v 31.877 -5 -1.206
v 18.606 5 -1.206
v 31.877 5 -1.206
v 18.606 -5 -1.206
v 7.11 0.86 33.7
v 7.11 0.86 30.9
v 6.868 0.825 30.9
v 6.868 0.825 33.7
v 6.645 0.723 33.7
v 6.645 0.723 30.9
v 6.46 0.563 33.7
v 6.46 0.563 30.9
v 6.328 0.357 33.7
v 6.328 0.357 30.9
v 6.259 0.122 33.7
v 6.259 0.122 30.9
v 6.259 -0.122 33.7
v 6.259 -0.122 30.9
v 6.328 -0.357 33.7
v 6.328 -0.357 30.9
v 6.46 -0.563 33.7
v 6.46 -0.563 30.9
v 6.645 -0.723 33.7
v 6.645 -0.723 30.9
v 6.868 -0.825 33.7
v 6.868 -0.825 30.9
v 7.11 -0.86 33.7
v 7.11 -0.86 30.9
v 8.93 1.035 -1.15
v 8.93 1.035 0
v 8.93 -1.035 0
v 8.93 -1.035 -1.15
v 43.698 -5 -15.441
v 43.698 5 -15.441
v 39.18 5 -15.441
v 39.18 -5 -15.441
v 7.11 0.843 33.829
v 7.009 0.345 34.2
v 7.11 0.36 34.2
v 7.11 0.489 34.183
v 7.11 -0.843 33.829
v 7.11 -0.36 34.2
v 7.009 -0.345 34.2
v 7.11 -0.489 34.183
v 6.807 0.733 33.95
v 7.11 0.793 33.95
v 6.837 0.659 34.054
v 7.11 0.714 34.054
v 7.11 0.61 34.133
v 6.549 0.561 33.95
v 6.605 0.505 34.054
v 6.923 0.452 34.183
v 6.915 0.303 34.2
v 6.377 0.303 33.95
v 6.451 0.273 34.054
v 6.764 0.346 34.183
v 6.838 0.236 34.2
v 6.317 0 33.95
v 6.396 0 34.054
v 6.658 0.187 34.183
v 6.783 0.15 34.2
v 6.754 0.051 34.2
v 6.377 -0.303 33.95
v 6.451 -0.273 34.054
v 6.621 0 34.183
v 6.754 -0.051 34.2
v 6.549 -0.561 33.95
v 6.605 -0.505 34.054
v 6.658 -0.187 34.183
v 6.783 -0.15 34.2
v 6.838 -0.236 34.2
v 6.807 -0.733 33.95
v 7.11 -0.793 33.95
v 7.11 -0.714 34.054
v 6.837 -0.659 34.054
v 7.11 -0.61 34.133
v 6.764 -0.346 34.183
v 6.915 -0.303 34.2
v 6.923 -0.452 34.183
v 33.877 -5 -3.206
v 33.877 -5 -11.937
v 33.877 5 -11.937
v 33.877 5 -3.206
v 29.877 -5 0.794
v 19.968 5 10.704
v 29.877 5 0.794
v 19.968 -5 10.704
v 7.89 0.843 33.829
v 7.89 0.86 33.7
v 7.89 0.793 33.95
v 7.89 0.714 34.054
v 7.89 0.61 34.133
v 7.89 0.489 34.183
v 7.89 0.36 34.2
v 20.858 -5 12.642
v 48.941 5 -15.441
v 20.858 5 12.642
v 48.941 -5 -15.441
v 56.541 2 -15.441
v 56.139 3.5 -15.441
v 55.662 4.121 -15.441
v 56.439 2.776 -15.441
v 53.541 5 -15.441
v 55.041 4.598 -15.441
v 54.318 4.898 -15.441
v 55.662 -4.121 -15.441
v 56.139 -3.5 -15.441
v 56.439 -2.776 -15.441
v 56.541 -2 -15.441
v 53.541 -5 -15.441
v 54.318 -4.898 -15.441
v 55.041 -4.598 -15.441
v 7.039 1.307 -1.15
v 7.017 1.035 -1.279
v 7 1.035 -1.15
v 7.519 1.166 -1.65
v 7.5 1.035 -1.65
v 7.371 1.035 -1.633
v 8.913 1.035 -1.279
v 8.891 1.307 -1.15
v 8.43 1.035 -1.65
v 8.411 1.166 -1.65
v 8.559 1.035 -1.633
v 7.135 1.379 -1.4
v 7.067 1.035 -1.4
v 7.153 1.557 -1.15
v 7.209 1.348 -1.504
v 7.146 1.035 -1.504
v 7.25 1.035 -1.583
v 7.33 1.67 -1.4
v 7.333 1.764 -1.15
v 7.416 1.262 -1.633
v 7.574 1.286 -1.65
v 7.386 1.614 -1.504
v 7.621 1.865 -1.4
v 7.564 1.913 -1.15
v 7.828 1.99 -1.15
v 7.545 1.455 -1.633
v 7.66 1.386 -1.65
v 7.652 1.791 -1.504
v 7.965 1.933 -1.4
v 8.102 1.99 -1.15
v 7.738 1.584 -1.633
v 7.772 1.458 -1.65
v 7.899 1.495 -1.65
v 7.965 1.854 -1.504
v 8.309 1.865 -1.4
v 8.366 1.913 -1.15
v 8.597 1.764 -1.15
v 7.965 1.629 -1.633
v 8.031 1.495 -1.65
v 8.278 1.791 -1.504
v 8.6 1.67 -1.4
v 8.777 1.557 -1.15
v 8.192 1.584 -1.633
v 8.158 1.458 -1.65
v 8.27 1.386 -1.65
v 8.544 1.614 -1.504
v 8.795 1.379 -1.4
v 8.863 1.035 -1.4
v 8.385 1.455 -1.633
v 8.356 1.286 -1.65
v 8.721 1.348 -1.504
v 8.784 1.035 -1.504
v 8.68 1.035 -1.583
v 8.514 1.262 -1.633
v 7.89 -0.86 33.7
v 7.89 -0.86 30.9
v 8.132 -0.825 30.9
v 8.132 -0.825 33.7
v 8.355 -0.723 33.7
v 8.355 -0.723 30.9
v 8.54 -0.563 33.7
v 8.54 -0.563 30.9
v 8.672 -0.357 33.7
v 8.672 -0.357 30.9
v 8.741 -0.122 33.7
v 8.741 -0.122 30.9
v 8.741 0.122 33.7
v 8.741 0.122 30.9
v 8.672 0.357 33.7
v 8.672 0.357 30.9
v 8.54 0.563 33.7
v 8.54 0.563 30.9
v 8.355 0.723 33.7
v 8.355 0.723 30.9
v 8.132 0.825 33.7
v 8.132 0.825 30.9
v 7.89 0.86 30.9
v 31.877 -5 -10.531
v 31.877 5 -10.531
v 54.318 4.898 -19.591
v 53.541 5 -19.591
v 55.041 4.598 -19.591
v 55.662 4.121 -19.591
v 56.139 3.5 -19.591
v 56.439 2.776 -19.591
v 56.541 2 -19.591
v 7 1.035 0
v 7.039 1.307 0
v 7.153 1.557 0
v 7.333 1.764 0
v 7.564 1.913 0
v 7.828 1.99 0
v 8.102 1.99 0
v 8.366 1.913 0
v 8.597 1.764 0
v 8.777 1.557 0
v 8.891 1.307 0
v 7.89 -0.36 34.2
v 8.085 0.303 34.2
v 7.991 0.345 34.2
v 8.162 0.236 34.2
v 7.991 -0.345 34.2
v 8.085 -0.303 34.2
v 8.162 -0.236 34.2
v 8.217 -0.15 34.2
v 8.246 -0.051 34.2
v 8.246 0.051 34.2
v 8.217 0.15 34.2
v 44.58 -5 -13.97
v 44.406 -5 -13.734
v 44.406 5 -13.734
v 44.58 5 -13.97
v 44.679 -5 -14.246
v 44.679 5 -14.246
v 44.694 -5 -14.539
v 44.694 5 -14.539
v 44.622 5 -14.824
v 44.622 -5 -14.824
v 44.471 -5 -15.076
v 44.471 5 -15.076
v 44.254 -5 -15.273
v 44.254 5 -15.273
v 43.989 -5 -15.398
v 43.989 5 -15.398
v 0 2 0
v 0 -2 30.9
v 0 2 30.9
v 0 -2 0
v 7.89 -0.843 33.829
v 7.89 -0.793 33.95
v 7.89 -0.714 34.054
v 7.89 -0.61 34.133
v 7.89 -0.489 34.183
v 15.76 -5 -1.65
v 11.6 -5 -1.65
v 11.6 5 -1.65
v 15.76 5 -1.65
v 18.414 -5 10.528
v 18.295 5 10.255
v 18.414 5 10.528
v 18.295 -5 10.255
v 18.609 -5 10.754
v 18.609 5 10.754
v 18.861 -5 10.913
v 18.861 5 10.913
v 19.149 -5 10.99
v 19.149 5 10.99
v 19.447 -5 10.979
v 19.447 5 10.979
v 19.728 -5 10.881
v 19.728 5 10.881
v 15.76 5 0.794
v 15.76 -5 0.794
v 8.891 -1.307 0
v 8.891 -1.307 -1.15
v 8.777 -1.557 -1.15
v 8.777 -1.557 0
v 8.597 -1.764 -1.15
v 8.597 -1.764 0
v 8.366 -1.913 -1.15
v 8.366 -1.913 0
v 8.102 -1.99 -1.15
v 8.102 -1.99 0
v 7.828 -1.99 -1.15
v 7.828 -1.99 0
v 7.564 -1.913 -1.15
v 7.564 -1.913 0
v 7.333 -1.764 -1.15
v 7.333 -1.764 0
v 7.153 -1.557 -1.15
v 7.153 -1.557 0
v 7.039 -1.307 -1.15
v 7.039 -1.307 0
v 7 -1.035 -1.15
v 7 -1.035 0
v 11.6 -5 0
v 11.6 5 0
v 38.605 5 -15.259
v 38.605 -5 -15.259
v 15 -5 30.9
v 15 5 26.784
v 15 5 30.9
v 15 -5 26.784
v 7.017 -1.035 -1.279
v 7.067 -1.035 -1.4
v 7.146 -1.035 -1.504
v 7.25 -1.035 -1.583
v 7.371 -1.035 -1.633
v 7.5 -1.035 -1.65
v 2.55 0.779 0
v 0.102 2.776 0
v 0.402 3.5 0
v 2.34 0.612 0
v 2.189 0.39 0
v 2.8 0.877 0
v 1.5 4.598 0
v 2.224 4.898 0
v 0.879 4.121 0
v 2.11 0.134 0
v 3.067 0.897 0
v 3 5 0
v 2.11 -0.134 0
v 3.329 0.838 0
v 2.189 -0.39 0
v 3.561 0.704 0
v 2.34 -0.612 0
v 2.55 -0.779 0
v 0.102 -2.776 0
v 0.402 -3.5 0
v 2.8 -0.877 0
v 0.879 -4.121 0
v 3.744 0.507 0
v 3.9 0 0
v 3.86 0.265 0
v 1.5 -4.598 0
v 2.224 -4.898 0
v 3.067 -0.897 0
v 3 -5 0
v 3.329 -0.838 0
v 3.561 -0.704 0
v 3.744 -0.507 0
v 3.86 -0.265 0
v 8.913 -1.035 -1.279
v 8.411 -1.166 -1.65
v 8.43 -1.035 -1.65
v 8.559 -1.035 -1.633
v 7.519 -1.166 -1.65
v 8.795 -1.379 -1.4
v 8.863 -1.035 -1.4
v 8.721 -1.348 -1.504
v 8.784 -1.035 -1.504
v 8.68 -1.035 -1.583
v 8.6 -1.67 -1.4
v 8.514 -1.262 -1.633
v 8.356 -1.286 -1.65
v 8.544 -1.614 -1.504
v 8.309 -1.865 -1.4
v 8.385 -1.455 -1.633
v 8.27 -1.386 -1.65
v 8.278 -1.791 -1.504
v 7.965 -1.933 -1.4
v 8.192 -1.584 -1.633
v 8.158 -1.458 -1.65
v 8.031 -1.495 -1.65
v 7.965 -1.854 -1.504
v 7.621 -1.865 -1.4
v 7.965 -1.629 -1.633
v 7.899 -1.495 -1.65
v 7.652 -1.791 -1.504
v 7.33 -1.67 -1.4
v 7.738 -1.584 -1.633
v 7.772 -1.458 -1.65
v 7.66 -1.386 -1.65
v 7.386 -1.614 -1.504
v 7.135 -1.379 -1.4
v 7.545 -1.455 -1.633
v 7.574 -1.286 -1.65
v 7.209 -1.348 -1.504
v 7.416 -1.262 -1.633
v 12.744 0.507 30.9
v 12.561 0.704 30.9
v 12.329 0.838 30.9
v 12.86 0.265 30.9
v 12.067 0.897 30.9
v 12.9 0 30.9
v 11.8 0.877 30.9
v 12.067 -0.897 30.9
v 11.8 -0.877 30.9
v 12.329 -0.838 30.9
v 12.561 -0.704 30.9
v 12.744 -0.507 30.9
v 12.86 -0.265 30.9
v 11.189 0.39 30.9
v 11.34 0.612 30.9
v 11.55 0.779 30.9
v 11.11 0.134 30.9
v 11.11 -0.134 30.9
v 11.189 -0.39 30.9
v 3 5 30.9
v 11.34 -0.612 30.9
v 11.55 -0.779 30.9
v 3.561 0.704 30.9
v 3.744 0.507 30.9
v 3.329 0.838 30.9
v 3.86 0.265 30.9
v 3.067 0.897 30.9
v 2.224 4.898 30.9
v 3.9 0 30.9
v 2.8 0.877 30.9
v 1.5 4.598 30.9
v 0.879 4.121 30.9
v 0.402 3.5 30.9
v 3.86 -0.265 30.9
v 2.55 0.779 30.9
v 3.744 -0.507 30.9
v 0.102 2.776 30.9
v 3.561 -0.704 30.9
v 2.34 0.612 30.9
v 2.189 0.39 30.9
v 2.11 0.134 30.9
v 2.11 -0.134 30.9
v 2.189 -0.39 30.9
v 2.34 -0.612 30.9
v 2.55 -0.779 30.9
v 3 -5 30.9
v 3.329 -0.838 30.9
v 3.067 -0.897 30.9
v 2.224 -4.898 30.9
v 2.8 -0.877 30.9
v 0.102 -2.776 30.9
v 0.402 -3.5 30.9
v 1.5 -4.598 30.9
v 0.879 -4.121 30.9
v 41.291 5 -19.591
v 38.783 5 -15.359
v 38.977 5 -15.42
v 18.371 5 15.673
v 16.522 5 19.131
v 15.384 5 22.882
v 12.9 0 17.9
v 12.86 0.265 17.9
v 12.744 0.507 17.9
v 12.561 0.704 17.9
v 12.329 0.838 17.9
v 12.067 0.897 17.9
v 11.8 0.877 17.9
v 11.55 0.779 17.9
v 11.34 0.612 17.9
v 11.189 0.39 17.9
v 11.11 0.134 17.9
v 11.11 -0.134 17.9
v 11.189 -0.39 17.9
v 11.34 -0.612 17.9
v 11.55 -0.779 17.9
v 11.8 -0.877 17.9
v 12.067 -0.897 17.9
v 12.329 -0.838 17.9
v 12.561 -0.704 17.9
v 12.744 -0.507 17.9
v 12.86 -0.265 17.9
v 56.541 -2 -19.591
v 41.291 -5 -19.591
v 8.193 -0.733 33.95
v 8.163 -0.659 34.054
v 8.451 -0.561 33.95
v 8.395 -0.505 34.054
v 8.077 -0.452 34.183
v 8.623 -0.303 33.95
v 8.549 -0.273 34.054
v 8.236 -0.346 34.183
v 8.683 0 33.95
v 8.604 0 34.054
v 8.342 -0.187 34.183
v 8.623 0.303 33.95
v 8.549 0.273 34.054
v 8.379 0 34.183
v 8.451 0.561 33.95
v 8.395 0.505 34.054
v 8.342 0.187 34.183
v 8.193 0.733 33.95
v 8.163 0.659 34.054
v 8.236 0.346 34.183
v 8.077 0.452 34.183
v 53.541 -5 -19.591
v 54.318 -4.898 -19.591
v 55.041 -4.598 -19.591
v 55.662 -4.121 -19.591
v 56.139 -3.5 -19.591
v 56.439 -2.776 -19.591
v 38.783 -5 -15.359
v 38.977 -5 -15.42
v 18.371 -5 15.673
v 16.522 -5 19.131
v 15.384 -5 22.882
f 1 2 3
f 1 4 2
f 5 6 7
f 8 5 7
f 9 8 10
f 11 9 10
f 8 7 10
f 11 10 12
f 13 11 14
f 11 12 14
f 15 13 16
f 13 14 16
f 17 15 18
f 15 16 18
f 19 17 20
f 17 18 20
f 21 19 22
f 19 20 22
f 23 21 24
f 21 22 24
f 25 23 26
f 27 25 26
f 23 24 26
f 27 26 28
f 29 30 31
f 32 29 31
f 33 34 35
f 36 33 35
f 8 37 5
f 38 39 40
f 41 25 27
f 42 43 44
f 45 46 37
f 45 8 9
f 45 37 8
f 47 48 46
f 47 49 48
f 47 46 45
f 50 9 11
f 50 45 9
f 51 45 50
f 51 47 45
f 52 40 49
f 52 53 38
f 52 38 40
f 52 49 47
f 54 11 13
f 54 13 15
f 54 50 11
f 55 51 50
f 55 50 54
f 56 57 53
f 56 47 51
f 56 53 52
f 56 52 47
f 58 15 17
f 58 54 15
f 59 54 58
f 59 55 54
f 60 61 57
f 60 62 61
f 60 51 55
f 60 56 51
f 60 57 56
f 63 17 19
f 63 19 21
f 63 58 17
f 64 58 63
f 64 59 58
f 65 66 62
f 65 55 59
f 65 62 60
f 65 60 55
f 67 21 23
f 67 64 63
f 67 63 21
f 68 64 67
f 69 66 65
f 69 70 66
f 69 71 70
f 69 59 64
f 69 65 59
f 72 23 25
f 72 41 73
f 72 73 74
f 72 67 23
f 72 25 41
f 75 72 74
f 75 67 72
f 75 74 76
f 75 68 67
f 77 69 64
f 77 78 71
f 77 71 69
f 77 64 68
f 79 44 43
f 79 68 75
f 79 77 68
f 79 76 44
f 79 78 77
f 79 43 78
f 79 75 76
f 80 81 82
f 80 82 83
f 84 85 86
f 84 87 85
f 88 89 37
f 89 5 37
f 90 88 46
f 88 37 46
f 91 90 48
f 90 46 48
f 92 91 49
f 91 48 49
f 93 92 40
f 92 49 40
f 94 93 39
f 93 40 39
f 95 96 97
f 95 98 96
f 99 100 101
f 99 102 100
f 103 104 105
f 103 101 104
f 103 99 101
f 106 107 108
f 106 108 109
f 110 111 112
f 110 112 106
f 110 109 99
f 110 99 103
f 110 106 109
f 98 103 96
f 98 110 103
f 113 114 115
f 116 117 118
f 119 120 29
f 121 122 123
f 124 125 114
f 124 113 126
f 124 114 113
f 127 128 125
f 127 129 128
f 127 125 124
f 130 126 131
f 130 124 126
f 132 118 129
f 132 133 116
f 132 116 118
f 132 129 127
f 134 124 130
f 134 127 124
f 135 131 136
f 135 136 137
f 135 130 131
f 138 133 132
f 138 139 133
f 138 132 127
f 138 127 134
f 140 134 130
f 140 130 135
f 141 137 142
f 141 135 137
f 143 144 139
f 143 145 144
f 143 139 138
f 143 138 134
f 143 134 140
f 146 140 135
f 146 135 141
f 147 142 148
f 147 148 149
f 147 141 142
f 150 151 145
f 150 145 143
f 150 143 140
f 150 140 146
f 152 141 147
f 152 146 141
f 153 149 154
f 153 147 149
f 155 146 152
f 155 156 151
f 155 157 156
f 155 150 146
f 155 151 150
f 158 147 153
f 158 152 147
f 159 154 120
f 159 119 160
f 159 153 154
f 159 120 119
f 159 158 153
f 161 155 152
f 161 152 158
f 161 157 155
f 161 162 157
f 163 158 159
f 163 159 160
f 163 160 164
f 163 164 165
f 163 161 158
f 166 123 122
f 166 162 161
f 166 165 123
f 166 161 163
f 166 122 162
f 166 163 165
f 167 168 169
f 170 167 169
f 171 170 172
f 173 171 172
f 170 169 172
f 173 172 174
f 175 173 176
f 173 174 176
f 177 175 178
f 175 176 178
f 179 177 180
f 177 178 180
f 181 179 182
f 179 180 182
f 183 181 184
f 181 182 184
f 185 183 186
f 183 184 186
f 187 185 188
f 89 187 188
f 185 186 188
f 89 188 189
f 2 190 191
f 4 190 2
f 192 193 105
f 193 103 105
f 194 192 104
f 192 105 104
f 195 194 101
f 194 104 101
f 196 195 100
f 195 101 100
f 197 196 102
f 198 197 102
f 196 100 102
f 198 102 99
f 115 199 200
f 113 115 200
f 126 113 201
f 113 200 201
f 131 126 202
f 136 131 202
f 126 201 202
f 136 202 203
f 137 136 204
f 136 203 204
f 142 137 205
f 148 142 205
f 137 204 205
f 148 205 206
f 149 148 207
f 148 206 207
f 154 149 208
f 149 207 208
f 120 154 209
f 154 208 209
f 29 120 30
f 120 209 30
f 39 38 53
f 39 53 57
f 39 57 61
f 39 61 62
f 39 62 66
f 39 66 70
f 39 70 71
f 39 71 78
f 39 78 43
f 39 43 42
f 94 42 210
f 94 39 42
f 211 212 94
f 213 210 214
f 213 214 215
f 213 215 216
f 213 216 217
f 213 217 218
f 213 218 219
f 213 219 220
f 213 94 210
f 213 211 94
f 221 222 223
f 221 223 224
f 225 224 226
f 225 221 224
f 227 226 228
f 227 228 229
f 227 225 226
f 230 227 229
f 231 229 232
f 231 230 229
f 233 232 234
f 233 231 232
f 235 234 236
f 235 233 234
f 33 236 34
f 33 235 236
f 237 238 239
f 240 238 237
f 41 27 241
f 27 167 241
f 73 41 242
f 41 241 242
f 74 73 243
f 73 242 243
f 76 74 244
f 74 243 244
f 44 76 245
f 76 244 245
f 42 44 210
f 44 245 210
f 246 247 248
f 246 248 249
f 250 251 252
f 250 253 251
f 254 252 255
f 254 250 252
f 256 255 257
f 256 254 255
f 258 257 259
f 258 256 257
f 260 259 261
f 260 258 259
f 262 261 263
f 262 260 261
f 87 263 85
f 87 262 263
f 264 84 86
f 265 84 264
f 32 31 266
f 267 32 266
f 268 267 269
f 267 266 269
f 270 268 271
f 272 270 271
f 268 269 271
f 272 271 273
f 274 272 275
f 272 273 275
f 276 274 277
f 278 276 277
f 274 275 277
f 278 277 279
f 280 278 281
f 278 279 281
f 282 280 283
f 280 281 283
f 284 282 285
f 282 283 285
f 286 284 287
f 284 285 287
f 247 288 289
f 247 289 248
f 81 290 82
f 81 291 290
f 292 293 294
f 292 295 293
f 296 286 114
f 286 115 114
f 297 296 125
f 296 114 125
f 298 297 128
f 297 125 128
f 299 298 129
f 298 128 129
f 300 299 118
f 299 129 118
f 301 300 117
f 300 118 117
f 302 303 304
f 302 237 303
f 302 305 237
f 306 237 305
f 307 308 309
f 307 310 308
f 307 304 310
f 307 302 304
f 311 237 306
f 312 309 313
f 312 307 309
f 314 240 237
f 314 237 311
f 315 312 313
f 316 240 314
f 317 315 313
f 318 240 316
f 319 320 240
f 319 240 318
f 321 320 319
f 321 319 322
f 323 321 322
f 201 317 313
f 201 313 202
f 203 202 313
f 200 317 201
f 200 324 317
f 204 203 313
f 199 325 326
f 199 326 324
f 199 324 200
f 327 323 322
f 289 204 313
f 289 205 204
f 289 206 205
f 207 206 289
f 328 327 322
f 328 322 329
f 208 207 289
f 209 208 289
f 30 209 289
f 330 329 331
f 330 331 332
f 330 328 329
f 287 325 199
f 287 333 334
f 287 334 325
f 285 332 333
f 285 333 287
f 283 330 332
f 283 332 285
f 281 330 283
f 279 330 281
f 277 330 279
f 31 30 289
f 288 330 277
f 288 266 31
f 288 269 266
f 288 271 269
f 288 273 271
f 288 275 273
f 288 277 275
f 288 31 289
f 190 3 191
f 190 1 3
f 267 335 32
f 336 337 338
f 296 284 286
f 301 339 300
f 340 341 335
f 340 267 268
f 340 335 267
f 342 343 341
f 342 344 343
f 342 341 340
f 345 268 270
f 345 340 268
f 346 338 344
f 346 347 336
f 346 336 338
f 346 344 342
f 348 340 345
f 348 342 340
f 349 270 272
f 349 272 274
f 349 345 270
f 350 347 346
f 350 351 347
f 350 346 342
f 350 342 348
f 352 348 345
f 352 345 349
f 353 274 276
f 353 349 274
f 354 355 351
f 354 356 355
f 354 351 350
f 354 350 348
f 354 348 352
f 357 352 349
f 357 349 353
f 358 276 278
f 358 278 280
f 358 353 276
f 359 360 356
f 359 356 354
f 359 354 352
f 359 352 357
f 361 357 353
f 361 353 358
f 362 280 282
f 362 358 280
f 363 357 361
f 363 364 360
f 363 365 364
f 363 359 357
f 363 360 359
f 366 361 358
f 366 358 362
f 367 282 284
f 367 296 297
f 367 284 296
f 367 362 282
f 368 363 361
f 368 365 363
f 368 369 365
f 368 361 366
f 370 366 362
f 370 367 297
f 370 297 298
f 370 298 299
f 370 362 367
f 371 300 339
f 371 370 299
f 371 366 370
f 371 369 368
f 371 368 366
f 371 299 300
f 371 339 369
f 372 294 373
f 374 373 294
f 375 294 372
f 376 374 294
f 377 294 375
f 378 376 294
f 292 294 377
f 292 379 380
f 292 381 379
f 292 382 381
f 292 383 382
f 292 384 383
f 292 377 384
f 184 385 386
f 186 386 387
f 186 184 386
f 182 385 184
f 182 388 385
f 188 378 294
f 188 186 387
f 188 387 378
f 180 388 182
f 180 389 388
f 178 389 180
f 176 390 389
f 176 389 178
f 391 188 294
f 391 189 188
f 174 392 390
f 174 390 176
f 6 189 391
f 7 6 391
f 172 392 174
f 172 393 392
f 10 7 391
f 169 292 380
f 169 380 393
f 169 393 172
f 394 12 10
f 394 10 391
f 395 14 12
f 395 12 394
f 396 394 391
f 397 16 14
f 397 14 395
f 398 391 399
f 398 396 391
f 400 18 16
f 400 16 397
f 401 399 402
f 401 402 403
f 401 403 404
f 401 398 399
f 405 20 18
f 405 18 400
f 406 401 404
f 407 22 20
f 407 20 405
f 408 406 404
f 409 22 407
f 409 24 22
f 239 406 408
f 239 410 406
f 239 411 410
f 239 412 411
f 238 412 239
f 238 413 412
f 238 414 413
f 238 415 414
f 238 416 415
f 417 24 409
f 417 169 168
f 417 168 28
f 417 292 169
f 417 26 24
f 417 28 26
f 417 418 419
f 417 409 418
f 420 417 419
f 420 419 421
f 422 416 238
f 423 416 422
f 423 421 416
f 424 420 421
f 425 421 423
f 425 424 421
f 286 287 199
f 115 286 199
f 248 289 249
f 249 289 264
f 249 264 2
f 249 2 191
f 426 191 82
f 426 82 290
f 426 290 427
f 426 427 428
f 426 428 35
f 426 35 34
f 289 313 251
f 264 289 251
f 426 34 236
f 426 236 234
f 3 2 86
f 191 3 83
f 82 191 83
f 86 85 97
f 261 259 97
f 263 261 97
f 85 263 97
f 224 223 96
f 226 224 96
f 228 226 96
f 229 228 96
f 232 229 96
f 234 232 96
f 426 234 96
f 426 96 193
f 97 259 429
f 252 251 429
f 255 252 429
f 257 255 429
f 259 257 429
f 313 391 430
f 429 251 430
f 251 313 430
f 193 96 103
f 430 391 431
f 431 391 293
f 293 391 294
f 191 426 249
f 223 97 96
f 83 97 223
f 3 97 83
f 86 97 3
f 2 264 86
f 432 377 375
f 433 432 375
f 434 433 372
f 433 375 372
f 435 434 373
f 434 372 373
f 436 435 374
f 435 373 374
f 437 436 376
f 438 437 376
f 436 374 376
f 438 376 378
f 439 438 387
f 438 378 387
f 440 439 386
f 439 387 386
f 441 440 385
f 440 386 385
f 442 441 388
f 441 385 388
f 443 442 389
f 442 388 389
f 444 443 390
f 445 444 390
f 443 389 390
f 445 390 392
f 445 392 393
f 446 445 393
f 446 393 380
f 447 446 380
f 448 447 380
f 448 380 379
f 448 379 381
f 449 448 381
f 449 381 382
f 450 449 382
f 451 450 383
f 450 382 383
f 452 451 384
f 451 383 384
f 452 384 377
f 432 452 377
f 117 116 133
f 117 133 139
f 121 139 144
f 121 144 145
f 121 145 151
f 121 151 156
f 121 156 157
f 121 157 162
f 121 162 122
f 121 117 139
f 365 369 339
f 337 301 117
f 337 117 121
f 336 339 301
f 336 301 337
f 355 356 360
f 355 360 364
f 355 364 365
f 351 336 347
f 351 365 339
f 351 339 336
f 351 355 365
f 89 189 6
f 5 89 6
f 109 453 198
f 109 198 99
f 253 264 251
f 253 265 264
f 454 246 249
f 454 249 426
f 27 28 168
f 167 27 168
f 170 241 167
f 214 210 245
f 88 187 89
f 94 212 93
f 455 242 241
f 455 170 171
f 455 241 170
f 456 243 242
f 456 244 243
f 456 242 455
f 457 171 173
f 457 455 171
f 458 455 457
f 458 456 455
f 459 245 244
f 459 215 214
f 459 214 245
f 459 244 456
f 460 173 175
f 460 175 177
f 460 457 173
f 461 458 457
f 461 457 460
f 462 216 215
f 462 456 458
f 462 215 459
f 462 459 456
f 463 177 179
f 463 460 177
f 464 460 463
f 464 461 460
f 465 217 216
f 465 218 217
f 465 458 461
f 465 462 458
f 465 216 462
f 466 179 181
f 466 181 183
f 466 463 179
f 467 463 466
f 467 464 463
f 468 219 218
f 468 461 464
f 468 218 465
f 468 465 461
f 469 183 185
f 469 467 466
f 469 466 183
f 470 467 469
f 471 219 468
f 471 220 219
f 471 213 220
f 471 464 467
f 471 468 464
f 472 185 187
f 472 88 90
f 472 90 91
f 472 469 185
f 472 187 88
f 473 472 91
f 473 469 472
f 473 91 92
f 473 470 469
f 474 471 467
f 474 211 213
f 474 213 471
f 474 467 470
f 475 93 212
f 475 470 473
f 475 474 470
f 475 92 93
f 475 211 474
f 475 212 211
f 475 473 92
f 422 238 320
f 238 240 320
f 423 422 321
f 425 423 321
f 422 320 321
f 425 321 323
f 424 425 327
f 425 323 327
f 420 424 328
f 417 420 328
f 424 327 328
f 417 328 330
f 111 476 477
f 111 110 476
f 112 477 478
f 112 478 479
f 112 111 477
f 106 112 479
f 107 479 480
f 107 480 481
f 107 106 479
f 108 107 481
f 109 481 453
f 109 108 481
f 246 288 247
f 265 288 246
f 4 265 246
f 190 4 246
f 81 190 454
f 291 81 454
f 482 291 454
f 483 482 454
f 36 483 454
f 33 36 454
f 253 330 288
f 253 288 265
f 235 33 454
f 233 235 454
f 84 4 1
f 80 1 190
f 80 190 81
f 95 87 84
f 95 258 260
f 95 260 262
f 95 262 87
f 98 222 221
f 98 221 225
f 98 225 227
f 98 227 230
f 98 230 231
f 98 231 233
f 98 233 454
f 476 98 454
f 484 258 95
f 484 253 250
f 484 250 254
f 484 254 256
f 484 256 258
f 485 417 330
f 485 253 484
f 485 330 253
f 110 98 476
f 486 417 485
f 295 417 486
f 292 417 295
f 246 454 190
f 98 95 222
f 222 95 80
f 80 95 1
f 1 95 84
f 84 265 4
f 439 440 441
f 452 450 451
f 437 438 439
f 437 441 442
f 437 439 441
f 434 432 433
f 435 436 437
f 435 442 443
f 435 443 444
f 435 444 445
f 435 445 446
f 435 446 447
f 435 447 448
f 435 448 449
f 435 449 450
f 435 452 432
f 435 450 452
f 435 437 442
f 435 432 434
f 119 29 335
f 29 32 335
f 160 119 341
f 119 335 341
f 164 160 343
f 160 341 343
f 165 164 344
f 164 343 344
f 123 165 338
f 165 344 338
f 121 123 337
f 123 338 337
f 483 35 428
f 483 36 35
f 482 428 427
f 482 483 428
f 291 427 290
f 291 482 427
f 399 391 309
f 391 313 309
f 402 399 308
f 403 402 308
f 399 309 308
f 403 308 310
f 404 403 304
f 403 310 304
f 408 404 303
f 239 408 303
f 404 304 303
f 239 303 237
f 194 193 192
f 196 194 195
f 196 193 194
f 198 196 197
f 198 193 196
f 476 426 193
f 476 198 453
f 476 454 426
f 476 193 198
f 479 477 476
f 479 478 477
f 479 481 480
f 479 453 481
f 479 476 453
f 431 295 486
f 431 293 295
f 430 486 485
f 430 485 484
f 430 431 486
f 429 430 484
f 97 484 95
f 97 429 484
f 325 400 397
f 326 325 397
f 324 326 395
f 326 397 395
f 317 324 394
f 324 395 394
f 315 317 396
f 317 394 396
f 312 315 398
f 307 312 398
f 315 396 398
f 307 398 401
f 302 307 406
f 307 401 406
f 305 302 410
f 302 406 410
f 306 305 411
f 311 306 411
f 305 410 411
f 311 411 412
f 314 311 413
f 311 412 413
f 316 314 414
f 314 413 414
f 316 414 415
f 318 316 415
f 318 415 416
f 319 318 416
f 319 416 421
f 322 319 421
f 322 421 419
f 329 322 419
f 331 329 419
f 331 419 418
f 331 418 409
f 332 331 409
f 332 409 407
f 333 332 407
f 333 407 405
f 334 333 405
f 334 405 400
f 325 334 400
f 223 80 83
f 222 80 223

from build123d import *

# Parameters (mm, degrees)
F1_DEPTH = 5
F2_R     = 0.9
F3_DEPTH = 50.492125497
F4_DEPTH = 13
F6_DEPTH = 3.3
F8_DEPTH = 1.65
F9_R     = 0.5
F10_R    = 3
F11_R    = 20


with BuildPart() as f1:
    # F0 (on Front) → F1 (new body, symmetric)
    with BuildSketch(Plane.XZ):
        Polygon((15, 30.9), (0, 30.9), (0, 0), (11.6, 0), (11.6, -1.65), (15.76, -1.65), (41.291125497, -19.591125497), (56.541125497, -19.591125497), (56.541125497, -15.441125497), (48.941125497, -15.441125497), (15, 18.5), align=None)
        Polygon((31.8771428741, -10.5313410853), (18.6061007646, -1.2055699989), (31.8771428741, -1.2055699989), align=None, mode=Mode.SUBTRACT)
        with BuildLine():
            Line((33.8771428741, -11.9367727024), (33.8771428741, -3.2055699989))
            Line((33.8771428741, -3.2055699989), (44.405591591, -13.7340187158))
            ThreePointArc((44.405591591, -13.7340187158), (44.6223643423, -14.8238089293), (43.6984848098, -15.441125497))
            Line((43.6984848098, -15.441125497), (39.1802365995, -15.441125497))
            ThreePointArc((39.1802365995, -15.441125497), (38.8787292634, -15.3945893538), (38.6052839044, -15.2593121495))
            Line((38.6052839044, -15.2593121495), (33.8771428741, -11.9367727024))
        make_face(mode=Mode.SUBTRACT)
        with BuildLine():
            Line((29.8771428741, 0.7944300011), (15.76, 0.7944300011))
            Line((15.76, 0.7944300011), (18.2950155817, 10.25523695))
            ThreePointArc((18.2950155817, 10.25523695), (19.0021223629, 10.9623437312), (19.9680481892, 10.7035246861))
            Line((19.9680481892, 10.7035246861), (29.8771428741, 0.7944300011))
        make_face(mode=Mode.SUBTRACT)
    extrude(amount=F1_DEPTH, both=True)

    # F2 (on face) → F3 (cut, through all)
    with BuildSketch(Plane.XY.offset(30.9)):
        with Locations((3, 0)):
            Circle(F2_R)
    extrude(amount=-F3_DEPTH, mode=Mode.SUBTRACT)

    # F2 (on face) → F4 (cut)
    with BuildSketch(Plane.XY.offset(30.9)):
        with Locations((12, 0)):
            Circle(F2_R)
    extrude(amount=-F4_DEPTH, mode=Mode.SUBTRACT)

    # F5 (on face) → F6 (join)
    with BuildSketch(Plane.XY.offset(30.9)):
        with BuildLine():
            Line((7.89, 0.86), (7.11, 0.86))
            ThreePointArc((7.11, 0.86), (6.25, 0), (7.11, -0.86))
            Line((7.11, -0.86), (7.89, -0.86))
            ThreePointArc((7.89, -0.86), (8.75, 0), (7.89, 0.86))
        make_face()
    extrude(amount=F6_DEPTH)

    # F7 (on face) → F8 (join, through all)
    with BuildSketch(Plane(origin=(0, 0, 0), x_dir=(1, 0, 0), z_dir=(0, 0, -1))):
        with BuildLine():
            Line((8.93, -1.035), (8.93, 1.035))
            ThreePointArc((8.93, 1.035), (7.965, 2), (7, 1.035))
            Line((7, 1.035), (7, -1.035))
            ThreePointArc((7, -1.035), (7.965, -2), (8.93, -1.035))
        make_face()
    extrude(amount=F8_DEPTH)

    # F9
    f9_edges = [f1.edges().sort_by_distance(p)[0] for p in [
        (8.75, 0, 34.2),
        (7.5, 0.86, 34.2),
        (6.25, 0, 34.2),
        (7.5, -0.86, 34.2),
        (8.93, 0, -1.65),
        (7.965, -2, -1.65),
        (7, 0, -1.65),
        (7.965, 2, -1.65),
    ]]
    fillet(f9_edges, radius=F9_R)

    # F10
    f10_edges = [f1.edges().sort_by_distance(p)[0] for p in [
        (0, -5, 15.45),
        (0, 5, 15.45),
        (56.541125, -5, -17.516125),
        (56.541125, 5, -17.516125),
    ]]
    fillet(f10_edges, radius=F10_R)

    # F11
    f11_edges = [f1.edges().sort_by_distance(p)[0] for p in [
        (15, 0, 18.5),
    ]]
    fillet(f11_edges, radius=F11_R)


solid = f1.part
